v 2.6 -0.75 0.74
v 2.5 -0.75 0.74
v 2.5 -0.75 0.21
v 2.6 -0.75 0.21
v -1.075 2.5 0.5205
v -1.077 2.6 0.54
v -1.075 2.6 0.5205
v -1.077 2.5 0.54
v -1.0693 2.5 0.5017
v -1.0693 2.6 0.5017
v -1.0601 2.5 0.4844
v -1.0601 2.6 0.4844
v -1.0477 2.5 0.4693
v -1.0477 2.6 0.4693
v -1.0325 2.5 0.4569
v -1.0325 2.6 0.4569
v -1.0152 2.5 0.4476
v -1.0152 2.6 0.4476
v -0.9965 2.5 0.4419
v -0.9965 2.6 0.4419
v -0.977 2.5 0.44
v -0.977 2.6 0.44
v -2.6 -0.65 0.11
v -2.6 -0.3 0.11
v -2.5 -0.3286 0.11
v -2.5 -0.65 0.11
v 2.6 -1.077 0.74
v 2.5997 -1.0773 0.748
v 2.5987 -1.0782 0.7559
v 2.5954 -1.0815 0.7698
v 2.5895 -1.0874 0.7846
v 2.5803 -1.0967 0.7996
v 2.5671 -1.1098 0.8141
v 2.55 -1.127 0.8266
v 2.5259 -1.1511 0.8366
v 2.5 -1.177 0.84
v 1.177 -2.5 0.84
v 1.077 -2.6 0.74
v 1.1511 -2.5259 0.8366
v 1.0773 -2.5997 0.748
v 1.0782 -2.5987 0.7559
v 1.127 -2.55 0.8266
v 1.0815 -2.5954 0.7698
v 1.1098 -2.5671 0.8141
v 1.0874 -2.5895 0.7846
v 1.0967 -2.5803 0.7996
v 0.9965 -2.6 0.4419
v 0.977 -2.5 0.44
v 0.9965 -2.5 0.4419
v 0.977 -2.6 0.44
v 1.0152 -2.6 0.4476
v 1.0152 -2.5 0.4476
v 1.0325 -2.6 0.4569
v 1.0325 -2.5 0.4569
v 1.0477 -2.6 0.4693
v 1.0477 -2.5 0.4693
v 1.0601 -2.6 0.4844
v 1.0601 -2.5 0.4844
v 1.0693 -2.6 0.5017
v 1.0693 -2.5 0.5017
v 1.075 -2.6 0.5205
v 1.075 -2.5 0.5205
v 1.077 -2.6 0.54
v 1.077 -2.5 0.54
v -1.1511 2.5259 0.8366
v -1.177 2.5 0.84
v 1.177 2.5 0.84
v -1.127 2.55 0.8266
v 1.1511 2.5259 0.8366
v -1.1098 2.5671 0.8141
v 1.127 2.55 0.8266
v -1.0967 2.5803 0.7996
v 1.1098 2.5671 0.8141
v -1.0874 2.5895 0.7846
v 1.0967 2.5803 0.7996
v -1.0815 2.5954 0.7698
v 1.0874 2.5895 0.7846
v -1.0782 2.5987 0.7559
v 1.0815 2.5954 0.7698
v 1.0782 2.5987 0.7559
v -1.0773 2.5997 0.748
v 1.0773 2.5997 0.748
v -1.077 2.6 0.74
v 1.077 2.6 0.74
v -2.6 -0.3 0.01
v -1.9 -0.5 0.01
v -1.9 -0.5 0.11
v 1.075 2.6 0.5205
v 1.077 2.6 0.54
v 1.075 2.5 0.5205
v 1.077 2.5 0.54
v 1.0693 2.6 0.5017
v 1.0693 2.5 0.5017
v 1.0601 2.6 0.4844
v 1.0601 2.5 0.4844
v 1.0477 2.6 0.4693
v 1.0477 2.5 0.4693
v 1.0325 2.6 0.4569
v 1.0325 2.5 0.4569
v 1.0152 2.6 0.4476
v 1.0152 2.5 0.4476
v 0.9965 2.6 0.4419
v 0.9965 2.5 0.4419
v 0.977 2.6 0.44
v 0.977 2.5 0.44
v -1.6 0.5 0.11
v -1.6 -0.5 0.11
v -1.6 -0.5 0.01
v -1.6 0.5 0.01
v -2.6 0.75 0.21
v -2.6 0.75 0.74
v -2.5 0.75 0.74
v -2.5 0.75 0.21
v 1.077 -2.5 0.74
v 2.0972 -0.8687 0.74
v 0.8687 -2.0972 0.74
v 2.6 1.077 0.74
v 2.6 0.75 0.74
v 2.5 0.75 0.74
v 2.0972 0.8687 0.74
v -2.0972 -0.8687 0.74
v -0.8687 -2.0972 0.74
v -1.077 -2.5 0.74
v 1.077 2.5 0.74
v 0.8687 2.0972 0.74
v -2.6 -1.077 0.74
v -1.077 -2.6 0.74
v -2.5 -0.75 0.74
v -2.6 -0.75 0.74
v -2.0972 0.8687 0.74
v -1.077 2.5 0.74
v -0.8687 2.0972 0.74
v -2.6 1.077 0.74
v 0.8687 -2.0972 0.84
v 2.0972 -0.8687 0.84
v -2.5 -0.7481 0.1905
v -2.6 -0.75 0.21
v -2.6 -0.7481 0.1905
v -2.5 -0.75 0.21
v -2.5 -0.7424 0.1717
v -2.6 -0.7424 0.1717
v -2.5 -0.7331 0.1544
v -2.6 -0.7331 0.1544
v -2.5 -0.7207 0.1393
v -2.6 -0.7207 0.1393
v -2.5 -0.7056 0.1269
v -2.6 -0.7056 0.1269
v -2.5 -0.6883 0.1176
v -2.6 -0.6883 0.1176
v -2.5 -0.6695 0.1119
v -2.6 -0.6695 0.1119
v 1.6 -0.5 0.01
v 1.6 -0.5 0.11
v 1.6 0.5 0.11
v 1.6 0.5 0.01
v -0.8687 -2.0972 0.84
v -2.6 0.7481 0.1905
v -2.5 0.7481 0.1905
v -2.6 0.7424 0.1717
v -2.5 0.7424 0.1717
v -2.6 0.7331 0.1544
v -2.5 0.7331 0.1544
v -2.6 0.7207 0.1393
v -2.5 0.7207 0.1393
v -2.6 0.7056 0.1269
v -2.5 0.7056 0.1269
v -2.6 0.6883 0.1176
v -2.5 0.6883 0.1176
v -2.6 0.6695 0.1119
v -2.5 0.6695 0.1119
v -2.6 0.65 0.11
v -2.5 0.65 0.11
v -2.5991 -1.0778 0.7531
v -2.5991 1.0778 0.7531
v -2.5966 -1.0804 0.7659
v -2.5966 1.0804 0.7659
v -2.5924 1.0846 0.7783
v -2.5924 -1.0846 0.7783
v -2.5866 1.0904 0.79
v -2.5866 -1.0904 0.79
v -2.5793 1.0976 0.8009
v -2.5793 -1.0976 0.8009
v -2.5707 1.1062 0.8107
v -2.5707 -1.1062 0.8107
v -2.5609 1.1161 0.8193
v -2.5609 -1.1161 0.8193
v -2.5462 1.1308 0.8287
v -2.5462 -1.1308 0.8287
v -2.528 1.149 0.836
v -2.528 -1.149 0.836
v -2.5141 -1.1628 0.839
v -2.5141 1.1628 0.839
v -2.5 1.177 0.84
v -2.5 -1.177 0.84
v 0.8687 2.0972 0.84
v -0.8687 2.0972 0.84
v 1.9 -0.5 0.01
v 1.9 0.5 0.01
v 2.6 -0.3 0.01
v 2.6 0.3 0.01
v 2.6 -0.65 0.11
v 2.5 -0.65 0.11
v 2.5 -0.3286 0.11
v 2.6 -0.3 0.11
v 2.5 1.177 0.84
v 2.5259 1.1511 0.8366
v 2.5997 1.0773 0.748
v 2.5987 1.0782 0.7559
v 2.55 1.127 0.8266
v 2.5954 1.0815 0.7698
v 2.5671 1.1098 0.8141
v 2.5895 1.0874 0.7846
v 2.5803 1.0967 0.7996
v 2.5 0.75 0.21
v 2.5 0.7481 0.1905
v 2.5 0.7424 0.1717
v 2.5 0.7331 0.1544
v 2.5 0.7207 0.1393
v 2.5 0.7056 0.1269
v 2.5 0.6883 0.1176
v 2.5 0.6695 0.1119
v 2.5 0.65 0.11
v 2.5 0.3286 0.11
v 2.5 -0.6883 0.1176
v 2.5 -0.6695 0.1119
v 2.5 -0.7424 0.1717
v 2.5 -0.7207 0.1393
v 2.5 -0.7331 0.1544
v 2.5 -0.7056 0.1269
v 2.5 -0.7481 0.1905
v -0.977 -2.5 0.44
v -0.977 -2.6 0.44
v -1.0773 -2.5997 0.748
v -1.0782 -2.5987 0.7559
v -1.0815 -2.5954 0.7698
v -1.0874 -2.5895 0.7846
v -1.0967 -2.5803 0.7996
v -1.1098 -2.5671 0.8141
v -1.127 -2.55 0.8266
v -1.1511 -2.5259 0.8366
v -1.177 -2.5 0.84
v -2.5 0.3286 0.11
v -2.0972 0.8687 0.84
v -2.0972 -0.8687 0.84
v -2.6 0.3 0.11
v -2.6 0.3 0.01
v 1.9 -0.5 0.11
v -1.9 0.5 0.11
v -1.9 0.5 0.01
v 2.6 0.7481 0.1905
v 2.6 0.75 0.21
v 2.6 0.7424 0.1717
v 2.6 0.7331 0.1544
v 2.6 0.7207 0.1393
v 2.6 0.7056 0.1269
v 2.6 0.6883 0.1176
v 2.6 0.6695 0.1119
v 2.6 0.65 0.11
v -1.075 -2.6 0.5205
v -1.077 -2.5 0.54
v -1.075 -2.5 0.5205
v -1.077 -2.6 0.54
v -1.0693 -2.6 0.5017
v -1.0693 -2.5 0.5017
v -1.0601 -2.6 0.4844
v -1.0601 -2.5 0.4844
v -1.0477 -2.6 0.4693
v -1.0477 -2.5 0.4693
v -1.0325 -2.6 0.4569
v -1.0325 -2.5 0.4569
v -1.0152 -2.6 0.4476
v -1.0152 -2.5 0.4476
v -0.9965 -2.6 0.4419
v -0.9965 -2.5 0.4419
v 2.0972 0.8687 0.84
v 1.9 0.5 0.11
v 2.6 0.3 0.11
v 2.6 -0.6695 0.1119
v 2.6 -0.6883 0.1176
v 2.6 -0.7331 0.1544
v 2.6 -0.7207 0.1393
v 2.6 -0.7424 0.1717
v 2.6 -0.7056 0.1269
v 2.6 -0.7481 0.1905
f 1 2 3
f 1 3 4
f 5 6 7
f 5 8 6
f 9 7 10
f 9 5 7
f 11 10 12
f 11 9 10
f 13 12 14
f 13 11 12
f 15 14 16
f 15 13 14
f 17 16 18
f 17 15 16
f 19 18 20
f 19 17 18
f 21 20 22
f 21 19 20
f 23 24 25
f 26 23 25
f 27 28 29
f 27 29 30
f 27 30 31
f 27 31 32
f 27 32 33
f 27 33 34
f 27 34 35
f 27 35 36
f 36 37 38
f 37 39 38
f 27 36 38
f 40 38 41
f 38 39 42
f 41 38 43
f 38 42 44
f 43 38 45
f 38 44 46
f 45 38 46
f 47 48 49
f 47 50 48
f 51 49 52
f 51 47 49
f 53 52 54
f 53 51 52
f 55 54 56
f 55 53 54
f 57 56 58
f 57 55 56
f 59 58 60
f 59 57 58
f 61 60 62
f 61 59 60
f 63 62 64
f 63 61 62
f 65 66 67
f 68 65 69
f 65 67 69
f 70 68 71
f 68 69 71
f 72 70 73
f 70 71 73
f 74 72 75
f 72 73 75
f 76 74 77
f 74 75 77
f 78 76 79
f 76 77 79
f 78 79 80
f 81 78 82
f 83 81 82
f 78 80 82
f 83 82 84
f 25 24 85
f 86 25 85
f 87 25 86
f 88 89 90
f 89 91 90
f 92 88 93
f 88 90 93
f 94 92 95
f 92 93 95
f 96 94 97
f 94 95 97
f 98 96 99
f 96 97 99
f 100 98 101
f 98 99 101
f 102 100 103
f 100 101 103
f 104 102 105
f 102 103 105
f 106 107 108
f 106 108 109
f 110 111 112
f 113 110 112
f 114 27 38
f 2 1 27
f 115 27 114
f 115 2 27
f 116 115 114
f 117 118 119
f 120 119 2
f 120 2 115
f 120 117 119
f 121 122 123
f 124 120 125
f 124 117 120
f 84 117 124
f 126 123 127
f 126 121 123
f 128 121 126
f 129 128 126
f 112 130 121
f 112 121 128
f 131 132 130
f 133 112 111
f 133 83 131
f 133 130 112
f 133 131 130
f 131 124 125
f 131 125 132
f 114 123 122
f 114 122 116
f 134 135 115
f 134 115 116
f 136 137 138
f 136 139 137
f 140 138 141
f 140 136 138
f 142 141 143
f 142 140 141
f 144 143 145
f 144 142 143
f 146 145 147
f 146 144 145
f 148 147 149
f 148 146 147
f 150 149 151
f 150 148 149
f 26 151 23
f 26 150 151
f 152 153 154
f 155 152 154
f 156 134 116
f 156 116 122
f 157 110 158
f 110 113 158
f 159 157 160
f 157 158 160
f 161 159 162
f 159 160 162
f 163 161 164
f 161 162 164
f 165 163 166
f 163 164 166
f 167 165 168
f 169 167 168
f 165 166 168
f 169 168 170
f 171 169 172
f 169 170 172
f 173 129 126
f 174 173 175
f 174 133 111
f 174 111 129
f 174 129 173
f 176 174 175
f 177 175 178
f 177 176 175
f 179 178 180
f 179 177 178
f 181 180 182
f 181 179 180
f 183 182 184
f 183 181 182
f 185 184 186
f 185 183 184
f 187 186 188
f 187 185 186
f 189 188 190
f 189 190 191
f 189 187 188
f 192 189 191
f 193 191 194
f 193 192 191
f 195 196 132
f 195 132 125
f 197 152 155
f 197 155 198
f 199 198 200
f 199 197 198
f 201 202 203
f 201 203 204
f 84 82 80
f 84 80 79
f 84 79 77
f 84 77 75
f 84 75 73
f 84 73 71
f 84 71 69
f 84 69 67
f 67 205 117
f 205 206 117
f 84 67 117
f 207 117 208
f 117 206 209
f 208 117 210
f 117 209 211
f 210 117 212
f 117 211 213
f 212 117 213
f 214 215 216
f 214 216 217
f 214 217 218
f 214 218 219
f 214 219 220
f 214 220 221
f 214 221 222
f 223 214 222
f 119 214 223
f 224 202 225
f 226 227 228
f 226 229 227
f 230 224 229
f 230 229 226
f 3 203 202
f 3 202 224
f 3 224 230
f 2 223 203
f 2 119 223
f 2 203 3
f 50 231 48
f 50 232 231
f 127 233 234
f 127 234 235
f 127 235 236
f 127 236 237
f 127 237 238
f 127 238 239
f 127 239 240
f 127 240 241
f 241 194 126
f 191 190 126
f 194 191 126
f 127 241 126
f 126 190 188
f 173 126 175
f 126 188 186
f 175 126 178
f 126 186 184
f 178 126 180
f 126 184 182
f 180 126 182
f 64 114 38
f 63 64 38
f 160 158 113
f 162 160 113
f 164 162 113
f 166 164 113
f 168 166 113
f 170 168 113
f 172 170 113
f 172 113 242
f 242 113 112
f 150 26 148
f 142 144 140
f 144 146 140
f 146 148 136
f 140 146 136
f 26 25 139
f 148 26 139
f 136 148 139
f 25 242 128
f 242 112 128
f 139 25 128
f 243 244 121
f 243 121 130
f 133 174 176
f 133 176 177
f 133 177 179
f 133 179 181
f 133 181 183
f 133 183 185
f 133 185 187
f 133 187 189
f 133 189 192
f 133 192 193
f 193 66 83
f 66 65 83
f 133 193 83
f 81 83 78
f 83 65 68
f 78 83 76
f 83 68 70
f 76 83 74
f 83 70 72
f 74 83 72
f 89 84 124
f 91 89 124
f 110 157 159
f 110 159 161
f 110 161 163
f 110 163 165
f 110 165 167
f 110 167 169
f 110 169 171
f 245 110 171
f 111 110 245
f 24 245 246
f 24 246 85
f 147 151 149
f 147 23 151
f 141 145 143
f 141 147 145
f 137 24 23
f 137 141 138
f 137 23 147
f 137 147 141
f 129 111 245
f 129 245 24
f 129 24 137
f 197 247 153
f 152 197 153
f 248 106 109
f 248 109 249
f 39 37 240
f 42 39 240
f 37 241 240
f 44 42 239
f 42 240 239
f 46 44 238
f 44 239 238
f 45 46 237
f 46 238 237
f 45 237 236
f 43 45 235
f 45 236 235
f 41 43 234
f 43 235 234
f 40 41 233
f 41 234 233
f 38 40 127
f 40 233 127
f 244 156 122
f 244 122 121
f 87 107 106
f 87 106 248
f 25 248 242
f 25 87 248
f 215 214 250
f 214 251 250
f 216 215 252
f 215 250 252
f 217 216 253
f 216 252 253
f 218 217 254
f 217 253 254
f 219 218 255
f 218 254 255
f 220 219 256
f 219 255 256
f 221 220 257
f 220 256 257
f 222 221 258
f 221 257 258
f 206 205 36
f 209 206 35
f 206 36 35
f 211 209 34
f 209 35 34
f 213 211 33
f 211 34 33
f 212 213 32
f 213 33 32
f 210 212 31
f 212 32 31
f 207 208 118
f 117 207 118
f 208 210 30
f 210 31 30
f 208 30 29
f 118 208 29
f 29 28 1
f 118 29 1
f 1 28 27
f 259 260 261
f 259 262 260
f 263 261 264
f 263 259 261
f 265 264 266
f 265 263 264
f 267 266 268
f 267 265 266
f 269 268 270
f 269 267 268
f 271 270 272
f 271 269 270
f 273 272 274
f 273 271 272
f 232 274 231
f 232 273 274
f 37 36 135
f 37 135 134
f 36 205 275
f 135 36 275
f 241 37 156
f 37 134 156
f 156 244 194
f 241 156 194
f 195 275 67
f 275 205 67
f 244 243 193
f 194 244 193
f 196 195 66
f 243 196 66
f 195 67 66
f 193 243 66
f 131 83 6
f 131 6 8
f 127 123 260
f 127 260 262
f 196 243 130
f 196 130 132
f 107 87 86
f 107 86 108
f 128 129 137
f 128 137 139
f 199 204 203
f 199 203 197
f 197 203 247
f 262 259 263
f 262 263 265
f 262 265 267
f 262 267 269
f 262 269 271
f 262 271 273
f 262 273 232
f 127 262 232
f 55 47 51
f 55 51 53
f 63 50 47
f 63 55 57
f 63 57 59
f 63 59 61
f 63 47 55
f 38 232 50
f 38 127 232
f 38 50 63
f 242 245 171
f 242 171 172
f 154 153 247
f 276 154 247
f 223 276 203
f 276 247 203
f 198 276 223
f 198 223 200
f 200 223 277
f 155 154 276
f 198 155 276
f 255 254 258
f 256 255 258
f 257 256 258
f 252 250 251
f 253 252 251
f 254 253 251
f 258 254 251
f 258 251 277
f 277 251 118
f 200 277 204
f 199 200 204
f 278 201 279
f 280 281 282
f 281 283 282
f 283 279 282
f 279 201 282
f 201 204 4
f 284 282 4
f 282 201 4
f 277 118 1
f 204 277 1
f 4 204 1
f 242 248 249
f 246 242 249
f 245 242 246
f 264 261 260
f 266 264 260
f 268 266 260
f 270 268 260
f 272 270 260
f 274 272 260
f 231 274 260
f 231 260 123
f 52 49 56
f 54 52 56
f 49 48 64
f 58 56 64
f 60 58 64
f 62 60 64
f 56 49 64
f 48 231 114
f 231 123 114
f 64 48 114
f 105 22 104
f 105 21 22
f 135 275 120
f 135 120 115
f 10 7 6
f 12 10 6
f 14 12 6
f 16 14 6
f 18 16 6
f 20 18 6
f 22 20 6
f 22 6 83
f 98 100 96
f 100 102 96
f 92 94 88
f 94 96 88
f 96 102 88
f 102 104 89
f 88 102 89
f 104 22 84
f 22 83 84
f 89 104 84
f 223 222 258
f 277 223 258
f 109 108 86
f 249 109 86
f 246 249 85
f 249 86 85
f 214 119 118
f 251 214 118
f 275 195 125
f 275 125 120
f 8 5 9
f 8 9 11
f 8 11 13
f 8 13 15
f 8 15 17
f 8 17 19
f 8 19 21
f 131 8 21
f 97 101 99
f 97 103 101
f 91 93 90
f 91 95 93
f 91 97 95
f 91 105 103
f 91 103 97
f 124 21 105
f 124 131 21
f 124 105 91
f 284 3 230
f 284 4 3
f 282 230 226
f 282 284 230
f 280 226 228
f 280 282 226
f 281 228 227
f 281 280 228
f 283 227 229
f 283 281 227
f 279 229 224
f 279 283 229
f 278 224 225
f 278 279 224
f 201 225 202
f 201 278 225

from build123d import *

# Parameters (mm, degrees)
PAD001_DEPTH = 0.1
SKETCH006_W  = 2.15391
SKETCH006_H  = 0.1
PAD002_DEPTH = 0.3
SKETCH007_W  = 0.1
SKETCH007_H  = 1.5
PAD003_DEPTH = 0.63
FILLET_R     = 0.1
PAD004_DEPTH = 0.1
FILLET001_R  = 0.1


with BuildPart() as part:
    # Sketch001 (on DatumPlane) → Pad001 (new body)
    with BuildSketch(Plane.XY.offset(0.84)):
        Polygon((-1.076955, 2.6), (1.076955, 2.6), (2.6, 1.076955), (2.6, -1.076955), (1.076955, -2.6), (-1.076955, -2.6), (-2.6, -1.076955), (-2.6, 1.076955), align=None)
        Polygon((-0.868691, 2.097207), (0.868691, 2.097207), (2.097207, 0.868691), (2.097207, -0.868691), (0.868691, -2.097207), (-0.868691, -2.097207), (-2.097207, -0.868691), (-2.097207, 0.868691), align=None, mode=Mode.SUBTRACT)
    extrude(amount=-PAD001_DEPTH)

    # Sketch006 (on Face18 of Pad001) → Pad002 (join)
    with BuildSketch(Plane(origin=(0, 0, 0.74), x_dir=(1, 0, 0), z_dir=(0, 0, -1))):
        with Locations((0, 2.55)):
            Rectangle(SKETCH006_W, SKETCH006_H)
        with Locations((0, -2.55)):
            Rectangle(SKETCH006_W, SKETCH006_H)
    extrude(amount=PAD002_DEPTH)

    # Sketch007 (on Face16 of Pad002) → Pad003 (join)
    with BuildSketch(Plane(origin=(0, 0, 0.74), x_dir=(1, 0, 0), z_dir=(0, 0, -1))):
        with Locations((-2.55, 0)):
            Rectangle(SKETCH007_W, SKETCH007_H)
        with Locations((2.55, 0)):
            Rectangle(SKETCH007_W, SKETCH007_H)
    extrude(amount=PAD003_DEPTH)

    # Fillet
    fillet_edges = [part.edges().sort_by_distance(p)[0] for p in [
        (-1.076955, -2.55, 0.44),
        (1.076955, -2.55, 0.44),
        (1.076955, 2.55, 0.44),
        (-1.076955, 2.55, 0.44),
        (-2.55, 0.75, 0.11),
        (-2.55, -0.75, 0.11),
        (2.55, -0.75, 0.11),
        (2.55, 0.75, 0.11),
    ]]
    fillet(fillet_edges, radius=FILLET_R)

    # Sketch008 (on Face41 of Fillet) → Pad004 (join)
    with BuildSketch(Plane(origin=(0, 0, 0.11), x_dir=(1, 0, 0), z_dir=(0, 0, -1))):
        Polygon((-2.6, -0.3), (-2.6, 0.3), (-1.9, 0.5), (-1.6, 0.5), (-1.6, -0.5), (-1.9, -0.5), align=None)
        Polygon((2.6, -0.3), (2.6, 0.3), (1.9, 0.5), (1.6, 0.5), (1.6, -0.5), (1.9, -0.5), align=None)
    extrude(amount=PAD004_DEPTH)

    # Fillet001
    fillet001_edges = [part.edges().sort_by_distance(p)[0] for p in [
        (0, -2.6, 0.84),
        (-2.6, 0, 0.84),
        (0, 2.6, 0.84),
        (2.6, 0, 0.84),
    ]]
    fillet(fillet001_edges, radius=FILLET001_R)


solid = part.part
